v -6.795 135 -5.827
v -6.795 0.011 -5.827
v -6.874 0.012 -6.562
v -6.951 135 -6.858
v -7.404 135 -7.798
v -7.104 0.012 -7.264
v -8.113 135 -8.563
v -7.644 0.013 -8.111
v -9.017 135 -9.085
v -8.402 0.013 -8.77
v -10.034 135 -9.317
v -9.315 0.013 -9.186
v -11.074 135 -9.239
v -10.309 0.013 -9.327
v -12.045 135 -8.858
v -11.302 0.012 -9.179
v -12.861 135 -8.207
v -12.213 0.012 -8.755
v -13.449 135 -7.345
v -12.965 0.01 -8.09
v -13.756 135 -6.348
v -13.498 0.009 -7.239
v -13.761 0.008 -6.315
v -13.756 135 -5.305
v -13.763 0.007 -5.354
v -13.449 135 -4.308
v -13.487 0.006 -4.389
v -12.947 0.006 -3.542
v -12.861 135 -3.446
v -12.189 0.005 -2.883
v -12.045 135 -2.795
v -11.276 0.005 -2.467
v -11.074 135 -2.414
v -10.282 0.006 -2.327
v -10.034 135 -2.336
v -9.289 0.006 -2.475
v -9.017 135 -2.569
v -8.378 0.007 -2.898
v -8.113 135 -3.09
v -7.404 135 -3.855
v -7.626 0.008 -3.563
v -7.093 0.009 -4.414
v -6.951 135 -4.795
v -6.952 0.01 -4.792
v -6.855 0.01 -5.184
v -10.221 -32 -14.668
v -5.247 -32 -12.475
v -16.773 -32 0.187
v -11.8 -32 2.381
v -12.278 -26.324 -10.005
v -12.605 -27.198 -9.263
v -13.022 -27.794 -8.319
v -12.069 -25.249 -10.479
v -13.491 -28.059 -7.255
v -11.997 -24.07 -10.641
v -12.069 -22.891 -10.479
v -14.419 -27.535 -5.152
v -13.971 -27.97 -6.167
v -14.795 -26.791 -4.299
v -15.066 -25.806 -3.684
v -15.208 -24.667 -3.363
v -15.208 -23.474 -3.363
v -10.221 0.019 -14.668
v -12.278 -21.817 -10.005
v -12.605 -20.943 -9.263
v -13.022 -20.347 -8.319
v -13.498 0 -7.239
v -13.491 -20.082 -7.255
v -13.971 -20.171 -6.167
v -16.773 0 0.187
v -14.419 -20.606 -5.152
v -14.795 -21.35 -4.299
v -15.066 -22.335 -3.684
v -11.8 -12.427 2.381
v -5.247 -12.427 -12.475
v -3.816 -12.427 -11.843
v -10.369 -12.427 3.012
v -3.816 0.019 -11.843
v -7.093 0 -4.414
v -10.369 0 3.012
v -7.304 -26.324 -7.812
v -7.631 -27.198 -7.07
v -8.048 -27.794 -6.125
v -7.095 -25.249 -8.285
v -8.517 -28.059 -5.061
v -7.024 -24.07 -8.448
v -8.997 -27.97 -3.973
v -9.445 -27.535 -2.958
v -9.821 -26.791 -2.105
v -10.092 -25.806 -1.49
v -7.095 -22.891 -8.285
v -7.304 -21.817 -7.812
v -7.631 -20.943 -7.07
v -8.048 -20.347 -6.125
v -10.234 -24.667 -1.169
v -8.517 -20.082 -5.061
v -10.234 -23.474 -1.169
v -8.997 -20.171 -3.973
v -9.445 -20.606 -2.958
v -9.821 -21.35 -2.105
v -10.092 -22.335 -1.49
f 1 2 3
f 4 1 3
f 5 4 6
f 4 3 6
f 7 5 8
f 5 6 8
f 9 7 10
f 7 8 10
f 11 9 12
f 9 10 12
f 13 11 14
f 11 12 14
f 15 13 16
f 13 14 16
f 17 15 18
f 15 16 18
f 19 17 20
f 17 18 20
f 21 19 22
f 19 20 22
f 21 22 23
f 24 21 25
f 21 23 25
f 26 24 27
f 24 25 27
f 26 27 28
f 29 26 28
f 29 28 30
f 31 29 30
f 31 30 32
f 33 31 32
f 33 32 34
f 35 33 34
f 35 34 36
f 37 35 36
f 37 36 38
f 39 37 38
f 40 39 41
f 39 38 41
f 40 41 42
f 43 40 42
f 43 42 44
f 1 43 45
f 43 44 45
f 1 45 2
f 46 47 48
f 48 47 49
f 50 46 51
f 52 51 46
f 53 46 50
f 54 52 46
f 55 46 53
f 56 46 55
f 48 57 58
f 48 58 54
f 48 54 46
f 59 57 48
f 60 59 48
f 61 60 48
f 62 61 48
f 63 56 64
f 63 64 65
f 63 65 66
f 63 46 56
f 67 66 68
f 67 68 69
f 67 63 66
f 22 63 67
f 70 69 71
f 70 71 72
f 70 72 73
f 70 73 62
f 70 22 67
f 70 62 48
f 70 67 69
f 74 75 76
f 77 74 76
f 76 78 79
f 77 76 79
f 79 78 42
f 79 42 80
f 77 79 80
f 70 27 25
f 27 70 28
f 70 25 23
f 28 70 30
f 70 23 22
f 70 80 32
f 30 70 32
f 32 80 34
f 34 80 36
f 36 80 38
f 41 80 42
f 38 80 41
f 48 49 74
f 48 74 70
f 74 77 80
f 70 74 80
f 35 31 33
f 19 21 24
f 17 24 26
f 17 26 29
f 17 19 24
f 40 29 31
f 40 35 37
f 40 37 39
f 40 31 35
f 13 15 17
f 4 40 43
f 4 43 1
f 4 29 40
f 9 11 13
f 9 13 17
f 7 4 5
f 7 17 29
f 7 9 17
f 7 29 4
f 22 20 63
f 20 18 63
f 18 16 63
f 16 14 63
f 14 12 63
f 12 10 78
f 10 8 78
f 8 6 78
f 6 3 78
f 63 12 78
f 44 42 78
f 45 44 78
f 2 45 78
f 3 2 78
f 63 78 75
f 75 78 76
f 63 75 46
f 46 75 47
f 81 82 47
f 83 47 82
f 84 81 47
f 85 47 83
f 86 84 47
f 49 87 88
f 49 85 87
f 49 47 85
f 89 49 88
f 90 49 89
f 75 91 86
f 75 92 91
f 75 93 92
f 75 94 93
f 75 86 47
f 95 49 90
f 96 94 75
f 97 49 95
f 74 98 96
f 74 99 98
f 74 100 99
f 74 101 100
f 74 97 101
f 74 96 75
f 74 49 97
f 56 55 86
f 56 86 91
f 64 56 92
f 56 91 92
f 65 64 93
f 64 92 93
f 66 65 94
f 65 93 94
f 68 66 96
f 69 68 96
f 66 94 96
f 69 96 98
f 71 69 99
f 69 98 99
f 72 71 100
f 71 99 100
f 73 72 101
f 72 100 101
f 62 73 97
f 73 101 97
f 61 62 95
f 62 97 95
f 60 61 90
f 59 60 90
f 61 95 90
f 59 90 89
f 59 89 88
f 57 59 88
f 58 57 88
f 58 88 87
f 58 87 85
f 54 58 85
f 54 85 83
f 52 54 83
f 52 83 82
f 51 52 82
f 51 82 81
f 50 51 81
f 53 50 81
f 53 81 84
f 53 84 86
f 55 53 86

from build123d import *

# Parameters (mm, degrees)
SKETCH2_R           = 3.5
BOSS_EXTRUDE1_DEPTH = 135
BOSS_EXTRUDE2_DEPTH = 7
SKETCH4_R           = 4
CUT_EXTRUDE1_DEPTH  = 7
SKETCH5_W           = 1.564160686
SKETCH5_H           = 19.573383476
CUT_EXTRUDE2_DEPTH  = 19.821098843


with BuildPart() as part:
    # Sketch2 → Boss-Extrude1 (new body)
    with BuildSketch(Plane(origin=(0, 0, 0), x_dir=(1, 0, 0), z_dir=(0, 1, 0))):
        with Locations((-10.295474734, 5.826559877)):
            Circle(SKETCH2_R)
    extrude(amount=BOSS_EXTRUDE1_DEPTH)

    # Sketch3 → Boss-Extrude2 (add)
    with BuildSketch(Plane(origin=(-7.567781688, 0, -3.338011531), x_dir=(-0.403567776, 0, 0.914949753), z_dir=(-0.914949753, 0, -0.403567776))):
        Polygon((-9.296087677, 0.018668346), (-9.296087677, -32), (6.940301507, -32), (6.940301507, 0), align=None)
    extrude(amount=BOSS_EXTRUDE2_DEPTH)

    # Sketch4 → Cut-Extrude1 (cut)
    with BuildSketch(Plane(origin=(-7.567781688, 0, -3.338011531), x_dir=(0.403567776, 0, -0.914949753), z_dir=(0.914949753, 0, 0.403567776))):
        with Locations((0.894610349, -24.070410288)):
            Circle(SKETCH4_R)
    extrude(amount=-CUT_EXTRUDE1_DEPTH, mode=Mode.SUBTRACT)

    # Sketch5 → Cut-Extrude2 (cut, through all)
    with BuildSketch(Plane(origin=(-2.800882044, 0, 6.350027148), x_dir=(0.914949753, 0, 0.403567776), z_dir=(-0.403567776, 0, 0.914949753))):
        with Locations((-9.053334217, -22.213308262)):
            Rectangle(SKETCH5_W, SKETCH5_H)
    extrude(amount=-CUT_EXTRUDE2_DEPTH, mode=Mode.SUBTRACT)


solid = part.part
